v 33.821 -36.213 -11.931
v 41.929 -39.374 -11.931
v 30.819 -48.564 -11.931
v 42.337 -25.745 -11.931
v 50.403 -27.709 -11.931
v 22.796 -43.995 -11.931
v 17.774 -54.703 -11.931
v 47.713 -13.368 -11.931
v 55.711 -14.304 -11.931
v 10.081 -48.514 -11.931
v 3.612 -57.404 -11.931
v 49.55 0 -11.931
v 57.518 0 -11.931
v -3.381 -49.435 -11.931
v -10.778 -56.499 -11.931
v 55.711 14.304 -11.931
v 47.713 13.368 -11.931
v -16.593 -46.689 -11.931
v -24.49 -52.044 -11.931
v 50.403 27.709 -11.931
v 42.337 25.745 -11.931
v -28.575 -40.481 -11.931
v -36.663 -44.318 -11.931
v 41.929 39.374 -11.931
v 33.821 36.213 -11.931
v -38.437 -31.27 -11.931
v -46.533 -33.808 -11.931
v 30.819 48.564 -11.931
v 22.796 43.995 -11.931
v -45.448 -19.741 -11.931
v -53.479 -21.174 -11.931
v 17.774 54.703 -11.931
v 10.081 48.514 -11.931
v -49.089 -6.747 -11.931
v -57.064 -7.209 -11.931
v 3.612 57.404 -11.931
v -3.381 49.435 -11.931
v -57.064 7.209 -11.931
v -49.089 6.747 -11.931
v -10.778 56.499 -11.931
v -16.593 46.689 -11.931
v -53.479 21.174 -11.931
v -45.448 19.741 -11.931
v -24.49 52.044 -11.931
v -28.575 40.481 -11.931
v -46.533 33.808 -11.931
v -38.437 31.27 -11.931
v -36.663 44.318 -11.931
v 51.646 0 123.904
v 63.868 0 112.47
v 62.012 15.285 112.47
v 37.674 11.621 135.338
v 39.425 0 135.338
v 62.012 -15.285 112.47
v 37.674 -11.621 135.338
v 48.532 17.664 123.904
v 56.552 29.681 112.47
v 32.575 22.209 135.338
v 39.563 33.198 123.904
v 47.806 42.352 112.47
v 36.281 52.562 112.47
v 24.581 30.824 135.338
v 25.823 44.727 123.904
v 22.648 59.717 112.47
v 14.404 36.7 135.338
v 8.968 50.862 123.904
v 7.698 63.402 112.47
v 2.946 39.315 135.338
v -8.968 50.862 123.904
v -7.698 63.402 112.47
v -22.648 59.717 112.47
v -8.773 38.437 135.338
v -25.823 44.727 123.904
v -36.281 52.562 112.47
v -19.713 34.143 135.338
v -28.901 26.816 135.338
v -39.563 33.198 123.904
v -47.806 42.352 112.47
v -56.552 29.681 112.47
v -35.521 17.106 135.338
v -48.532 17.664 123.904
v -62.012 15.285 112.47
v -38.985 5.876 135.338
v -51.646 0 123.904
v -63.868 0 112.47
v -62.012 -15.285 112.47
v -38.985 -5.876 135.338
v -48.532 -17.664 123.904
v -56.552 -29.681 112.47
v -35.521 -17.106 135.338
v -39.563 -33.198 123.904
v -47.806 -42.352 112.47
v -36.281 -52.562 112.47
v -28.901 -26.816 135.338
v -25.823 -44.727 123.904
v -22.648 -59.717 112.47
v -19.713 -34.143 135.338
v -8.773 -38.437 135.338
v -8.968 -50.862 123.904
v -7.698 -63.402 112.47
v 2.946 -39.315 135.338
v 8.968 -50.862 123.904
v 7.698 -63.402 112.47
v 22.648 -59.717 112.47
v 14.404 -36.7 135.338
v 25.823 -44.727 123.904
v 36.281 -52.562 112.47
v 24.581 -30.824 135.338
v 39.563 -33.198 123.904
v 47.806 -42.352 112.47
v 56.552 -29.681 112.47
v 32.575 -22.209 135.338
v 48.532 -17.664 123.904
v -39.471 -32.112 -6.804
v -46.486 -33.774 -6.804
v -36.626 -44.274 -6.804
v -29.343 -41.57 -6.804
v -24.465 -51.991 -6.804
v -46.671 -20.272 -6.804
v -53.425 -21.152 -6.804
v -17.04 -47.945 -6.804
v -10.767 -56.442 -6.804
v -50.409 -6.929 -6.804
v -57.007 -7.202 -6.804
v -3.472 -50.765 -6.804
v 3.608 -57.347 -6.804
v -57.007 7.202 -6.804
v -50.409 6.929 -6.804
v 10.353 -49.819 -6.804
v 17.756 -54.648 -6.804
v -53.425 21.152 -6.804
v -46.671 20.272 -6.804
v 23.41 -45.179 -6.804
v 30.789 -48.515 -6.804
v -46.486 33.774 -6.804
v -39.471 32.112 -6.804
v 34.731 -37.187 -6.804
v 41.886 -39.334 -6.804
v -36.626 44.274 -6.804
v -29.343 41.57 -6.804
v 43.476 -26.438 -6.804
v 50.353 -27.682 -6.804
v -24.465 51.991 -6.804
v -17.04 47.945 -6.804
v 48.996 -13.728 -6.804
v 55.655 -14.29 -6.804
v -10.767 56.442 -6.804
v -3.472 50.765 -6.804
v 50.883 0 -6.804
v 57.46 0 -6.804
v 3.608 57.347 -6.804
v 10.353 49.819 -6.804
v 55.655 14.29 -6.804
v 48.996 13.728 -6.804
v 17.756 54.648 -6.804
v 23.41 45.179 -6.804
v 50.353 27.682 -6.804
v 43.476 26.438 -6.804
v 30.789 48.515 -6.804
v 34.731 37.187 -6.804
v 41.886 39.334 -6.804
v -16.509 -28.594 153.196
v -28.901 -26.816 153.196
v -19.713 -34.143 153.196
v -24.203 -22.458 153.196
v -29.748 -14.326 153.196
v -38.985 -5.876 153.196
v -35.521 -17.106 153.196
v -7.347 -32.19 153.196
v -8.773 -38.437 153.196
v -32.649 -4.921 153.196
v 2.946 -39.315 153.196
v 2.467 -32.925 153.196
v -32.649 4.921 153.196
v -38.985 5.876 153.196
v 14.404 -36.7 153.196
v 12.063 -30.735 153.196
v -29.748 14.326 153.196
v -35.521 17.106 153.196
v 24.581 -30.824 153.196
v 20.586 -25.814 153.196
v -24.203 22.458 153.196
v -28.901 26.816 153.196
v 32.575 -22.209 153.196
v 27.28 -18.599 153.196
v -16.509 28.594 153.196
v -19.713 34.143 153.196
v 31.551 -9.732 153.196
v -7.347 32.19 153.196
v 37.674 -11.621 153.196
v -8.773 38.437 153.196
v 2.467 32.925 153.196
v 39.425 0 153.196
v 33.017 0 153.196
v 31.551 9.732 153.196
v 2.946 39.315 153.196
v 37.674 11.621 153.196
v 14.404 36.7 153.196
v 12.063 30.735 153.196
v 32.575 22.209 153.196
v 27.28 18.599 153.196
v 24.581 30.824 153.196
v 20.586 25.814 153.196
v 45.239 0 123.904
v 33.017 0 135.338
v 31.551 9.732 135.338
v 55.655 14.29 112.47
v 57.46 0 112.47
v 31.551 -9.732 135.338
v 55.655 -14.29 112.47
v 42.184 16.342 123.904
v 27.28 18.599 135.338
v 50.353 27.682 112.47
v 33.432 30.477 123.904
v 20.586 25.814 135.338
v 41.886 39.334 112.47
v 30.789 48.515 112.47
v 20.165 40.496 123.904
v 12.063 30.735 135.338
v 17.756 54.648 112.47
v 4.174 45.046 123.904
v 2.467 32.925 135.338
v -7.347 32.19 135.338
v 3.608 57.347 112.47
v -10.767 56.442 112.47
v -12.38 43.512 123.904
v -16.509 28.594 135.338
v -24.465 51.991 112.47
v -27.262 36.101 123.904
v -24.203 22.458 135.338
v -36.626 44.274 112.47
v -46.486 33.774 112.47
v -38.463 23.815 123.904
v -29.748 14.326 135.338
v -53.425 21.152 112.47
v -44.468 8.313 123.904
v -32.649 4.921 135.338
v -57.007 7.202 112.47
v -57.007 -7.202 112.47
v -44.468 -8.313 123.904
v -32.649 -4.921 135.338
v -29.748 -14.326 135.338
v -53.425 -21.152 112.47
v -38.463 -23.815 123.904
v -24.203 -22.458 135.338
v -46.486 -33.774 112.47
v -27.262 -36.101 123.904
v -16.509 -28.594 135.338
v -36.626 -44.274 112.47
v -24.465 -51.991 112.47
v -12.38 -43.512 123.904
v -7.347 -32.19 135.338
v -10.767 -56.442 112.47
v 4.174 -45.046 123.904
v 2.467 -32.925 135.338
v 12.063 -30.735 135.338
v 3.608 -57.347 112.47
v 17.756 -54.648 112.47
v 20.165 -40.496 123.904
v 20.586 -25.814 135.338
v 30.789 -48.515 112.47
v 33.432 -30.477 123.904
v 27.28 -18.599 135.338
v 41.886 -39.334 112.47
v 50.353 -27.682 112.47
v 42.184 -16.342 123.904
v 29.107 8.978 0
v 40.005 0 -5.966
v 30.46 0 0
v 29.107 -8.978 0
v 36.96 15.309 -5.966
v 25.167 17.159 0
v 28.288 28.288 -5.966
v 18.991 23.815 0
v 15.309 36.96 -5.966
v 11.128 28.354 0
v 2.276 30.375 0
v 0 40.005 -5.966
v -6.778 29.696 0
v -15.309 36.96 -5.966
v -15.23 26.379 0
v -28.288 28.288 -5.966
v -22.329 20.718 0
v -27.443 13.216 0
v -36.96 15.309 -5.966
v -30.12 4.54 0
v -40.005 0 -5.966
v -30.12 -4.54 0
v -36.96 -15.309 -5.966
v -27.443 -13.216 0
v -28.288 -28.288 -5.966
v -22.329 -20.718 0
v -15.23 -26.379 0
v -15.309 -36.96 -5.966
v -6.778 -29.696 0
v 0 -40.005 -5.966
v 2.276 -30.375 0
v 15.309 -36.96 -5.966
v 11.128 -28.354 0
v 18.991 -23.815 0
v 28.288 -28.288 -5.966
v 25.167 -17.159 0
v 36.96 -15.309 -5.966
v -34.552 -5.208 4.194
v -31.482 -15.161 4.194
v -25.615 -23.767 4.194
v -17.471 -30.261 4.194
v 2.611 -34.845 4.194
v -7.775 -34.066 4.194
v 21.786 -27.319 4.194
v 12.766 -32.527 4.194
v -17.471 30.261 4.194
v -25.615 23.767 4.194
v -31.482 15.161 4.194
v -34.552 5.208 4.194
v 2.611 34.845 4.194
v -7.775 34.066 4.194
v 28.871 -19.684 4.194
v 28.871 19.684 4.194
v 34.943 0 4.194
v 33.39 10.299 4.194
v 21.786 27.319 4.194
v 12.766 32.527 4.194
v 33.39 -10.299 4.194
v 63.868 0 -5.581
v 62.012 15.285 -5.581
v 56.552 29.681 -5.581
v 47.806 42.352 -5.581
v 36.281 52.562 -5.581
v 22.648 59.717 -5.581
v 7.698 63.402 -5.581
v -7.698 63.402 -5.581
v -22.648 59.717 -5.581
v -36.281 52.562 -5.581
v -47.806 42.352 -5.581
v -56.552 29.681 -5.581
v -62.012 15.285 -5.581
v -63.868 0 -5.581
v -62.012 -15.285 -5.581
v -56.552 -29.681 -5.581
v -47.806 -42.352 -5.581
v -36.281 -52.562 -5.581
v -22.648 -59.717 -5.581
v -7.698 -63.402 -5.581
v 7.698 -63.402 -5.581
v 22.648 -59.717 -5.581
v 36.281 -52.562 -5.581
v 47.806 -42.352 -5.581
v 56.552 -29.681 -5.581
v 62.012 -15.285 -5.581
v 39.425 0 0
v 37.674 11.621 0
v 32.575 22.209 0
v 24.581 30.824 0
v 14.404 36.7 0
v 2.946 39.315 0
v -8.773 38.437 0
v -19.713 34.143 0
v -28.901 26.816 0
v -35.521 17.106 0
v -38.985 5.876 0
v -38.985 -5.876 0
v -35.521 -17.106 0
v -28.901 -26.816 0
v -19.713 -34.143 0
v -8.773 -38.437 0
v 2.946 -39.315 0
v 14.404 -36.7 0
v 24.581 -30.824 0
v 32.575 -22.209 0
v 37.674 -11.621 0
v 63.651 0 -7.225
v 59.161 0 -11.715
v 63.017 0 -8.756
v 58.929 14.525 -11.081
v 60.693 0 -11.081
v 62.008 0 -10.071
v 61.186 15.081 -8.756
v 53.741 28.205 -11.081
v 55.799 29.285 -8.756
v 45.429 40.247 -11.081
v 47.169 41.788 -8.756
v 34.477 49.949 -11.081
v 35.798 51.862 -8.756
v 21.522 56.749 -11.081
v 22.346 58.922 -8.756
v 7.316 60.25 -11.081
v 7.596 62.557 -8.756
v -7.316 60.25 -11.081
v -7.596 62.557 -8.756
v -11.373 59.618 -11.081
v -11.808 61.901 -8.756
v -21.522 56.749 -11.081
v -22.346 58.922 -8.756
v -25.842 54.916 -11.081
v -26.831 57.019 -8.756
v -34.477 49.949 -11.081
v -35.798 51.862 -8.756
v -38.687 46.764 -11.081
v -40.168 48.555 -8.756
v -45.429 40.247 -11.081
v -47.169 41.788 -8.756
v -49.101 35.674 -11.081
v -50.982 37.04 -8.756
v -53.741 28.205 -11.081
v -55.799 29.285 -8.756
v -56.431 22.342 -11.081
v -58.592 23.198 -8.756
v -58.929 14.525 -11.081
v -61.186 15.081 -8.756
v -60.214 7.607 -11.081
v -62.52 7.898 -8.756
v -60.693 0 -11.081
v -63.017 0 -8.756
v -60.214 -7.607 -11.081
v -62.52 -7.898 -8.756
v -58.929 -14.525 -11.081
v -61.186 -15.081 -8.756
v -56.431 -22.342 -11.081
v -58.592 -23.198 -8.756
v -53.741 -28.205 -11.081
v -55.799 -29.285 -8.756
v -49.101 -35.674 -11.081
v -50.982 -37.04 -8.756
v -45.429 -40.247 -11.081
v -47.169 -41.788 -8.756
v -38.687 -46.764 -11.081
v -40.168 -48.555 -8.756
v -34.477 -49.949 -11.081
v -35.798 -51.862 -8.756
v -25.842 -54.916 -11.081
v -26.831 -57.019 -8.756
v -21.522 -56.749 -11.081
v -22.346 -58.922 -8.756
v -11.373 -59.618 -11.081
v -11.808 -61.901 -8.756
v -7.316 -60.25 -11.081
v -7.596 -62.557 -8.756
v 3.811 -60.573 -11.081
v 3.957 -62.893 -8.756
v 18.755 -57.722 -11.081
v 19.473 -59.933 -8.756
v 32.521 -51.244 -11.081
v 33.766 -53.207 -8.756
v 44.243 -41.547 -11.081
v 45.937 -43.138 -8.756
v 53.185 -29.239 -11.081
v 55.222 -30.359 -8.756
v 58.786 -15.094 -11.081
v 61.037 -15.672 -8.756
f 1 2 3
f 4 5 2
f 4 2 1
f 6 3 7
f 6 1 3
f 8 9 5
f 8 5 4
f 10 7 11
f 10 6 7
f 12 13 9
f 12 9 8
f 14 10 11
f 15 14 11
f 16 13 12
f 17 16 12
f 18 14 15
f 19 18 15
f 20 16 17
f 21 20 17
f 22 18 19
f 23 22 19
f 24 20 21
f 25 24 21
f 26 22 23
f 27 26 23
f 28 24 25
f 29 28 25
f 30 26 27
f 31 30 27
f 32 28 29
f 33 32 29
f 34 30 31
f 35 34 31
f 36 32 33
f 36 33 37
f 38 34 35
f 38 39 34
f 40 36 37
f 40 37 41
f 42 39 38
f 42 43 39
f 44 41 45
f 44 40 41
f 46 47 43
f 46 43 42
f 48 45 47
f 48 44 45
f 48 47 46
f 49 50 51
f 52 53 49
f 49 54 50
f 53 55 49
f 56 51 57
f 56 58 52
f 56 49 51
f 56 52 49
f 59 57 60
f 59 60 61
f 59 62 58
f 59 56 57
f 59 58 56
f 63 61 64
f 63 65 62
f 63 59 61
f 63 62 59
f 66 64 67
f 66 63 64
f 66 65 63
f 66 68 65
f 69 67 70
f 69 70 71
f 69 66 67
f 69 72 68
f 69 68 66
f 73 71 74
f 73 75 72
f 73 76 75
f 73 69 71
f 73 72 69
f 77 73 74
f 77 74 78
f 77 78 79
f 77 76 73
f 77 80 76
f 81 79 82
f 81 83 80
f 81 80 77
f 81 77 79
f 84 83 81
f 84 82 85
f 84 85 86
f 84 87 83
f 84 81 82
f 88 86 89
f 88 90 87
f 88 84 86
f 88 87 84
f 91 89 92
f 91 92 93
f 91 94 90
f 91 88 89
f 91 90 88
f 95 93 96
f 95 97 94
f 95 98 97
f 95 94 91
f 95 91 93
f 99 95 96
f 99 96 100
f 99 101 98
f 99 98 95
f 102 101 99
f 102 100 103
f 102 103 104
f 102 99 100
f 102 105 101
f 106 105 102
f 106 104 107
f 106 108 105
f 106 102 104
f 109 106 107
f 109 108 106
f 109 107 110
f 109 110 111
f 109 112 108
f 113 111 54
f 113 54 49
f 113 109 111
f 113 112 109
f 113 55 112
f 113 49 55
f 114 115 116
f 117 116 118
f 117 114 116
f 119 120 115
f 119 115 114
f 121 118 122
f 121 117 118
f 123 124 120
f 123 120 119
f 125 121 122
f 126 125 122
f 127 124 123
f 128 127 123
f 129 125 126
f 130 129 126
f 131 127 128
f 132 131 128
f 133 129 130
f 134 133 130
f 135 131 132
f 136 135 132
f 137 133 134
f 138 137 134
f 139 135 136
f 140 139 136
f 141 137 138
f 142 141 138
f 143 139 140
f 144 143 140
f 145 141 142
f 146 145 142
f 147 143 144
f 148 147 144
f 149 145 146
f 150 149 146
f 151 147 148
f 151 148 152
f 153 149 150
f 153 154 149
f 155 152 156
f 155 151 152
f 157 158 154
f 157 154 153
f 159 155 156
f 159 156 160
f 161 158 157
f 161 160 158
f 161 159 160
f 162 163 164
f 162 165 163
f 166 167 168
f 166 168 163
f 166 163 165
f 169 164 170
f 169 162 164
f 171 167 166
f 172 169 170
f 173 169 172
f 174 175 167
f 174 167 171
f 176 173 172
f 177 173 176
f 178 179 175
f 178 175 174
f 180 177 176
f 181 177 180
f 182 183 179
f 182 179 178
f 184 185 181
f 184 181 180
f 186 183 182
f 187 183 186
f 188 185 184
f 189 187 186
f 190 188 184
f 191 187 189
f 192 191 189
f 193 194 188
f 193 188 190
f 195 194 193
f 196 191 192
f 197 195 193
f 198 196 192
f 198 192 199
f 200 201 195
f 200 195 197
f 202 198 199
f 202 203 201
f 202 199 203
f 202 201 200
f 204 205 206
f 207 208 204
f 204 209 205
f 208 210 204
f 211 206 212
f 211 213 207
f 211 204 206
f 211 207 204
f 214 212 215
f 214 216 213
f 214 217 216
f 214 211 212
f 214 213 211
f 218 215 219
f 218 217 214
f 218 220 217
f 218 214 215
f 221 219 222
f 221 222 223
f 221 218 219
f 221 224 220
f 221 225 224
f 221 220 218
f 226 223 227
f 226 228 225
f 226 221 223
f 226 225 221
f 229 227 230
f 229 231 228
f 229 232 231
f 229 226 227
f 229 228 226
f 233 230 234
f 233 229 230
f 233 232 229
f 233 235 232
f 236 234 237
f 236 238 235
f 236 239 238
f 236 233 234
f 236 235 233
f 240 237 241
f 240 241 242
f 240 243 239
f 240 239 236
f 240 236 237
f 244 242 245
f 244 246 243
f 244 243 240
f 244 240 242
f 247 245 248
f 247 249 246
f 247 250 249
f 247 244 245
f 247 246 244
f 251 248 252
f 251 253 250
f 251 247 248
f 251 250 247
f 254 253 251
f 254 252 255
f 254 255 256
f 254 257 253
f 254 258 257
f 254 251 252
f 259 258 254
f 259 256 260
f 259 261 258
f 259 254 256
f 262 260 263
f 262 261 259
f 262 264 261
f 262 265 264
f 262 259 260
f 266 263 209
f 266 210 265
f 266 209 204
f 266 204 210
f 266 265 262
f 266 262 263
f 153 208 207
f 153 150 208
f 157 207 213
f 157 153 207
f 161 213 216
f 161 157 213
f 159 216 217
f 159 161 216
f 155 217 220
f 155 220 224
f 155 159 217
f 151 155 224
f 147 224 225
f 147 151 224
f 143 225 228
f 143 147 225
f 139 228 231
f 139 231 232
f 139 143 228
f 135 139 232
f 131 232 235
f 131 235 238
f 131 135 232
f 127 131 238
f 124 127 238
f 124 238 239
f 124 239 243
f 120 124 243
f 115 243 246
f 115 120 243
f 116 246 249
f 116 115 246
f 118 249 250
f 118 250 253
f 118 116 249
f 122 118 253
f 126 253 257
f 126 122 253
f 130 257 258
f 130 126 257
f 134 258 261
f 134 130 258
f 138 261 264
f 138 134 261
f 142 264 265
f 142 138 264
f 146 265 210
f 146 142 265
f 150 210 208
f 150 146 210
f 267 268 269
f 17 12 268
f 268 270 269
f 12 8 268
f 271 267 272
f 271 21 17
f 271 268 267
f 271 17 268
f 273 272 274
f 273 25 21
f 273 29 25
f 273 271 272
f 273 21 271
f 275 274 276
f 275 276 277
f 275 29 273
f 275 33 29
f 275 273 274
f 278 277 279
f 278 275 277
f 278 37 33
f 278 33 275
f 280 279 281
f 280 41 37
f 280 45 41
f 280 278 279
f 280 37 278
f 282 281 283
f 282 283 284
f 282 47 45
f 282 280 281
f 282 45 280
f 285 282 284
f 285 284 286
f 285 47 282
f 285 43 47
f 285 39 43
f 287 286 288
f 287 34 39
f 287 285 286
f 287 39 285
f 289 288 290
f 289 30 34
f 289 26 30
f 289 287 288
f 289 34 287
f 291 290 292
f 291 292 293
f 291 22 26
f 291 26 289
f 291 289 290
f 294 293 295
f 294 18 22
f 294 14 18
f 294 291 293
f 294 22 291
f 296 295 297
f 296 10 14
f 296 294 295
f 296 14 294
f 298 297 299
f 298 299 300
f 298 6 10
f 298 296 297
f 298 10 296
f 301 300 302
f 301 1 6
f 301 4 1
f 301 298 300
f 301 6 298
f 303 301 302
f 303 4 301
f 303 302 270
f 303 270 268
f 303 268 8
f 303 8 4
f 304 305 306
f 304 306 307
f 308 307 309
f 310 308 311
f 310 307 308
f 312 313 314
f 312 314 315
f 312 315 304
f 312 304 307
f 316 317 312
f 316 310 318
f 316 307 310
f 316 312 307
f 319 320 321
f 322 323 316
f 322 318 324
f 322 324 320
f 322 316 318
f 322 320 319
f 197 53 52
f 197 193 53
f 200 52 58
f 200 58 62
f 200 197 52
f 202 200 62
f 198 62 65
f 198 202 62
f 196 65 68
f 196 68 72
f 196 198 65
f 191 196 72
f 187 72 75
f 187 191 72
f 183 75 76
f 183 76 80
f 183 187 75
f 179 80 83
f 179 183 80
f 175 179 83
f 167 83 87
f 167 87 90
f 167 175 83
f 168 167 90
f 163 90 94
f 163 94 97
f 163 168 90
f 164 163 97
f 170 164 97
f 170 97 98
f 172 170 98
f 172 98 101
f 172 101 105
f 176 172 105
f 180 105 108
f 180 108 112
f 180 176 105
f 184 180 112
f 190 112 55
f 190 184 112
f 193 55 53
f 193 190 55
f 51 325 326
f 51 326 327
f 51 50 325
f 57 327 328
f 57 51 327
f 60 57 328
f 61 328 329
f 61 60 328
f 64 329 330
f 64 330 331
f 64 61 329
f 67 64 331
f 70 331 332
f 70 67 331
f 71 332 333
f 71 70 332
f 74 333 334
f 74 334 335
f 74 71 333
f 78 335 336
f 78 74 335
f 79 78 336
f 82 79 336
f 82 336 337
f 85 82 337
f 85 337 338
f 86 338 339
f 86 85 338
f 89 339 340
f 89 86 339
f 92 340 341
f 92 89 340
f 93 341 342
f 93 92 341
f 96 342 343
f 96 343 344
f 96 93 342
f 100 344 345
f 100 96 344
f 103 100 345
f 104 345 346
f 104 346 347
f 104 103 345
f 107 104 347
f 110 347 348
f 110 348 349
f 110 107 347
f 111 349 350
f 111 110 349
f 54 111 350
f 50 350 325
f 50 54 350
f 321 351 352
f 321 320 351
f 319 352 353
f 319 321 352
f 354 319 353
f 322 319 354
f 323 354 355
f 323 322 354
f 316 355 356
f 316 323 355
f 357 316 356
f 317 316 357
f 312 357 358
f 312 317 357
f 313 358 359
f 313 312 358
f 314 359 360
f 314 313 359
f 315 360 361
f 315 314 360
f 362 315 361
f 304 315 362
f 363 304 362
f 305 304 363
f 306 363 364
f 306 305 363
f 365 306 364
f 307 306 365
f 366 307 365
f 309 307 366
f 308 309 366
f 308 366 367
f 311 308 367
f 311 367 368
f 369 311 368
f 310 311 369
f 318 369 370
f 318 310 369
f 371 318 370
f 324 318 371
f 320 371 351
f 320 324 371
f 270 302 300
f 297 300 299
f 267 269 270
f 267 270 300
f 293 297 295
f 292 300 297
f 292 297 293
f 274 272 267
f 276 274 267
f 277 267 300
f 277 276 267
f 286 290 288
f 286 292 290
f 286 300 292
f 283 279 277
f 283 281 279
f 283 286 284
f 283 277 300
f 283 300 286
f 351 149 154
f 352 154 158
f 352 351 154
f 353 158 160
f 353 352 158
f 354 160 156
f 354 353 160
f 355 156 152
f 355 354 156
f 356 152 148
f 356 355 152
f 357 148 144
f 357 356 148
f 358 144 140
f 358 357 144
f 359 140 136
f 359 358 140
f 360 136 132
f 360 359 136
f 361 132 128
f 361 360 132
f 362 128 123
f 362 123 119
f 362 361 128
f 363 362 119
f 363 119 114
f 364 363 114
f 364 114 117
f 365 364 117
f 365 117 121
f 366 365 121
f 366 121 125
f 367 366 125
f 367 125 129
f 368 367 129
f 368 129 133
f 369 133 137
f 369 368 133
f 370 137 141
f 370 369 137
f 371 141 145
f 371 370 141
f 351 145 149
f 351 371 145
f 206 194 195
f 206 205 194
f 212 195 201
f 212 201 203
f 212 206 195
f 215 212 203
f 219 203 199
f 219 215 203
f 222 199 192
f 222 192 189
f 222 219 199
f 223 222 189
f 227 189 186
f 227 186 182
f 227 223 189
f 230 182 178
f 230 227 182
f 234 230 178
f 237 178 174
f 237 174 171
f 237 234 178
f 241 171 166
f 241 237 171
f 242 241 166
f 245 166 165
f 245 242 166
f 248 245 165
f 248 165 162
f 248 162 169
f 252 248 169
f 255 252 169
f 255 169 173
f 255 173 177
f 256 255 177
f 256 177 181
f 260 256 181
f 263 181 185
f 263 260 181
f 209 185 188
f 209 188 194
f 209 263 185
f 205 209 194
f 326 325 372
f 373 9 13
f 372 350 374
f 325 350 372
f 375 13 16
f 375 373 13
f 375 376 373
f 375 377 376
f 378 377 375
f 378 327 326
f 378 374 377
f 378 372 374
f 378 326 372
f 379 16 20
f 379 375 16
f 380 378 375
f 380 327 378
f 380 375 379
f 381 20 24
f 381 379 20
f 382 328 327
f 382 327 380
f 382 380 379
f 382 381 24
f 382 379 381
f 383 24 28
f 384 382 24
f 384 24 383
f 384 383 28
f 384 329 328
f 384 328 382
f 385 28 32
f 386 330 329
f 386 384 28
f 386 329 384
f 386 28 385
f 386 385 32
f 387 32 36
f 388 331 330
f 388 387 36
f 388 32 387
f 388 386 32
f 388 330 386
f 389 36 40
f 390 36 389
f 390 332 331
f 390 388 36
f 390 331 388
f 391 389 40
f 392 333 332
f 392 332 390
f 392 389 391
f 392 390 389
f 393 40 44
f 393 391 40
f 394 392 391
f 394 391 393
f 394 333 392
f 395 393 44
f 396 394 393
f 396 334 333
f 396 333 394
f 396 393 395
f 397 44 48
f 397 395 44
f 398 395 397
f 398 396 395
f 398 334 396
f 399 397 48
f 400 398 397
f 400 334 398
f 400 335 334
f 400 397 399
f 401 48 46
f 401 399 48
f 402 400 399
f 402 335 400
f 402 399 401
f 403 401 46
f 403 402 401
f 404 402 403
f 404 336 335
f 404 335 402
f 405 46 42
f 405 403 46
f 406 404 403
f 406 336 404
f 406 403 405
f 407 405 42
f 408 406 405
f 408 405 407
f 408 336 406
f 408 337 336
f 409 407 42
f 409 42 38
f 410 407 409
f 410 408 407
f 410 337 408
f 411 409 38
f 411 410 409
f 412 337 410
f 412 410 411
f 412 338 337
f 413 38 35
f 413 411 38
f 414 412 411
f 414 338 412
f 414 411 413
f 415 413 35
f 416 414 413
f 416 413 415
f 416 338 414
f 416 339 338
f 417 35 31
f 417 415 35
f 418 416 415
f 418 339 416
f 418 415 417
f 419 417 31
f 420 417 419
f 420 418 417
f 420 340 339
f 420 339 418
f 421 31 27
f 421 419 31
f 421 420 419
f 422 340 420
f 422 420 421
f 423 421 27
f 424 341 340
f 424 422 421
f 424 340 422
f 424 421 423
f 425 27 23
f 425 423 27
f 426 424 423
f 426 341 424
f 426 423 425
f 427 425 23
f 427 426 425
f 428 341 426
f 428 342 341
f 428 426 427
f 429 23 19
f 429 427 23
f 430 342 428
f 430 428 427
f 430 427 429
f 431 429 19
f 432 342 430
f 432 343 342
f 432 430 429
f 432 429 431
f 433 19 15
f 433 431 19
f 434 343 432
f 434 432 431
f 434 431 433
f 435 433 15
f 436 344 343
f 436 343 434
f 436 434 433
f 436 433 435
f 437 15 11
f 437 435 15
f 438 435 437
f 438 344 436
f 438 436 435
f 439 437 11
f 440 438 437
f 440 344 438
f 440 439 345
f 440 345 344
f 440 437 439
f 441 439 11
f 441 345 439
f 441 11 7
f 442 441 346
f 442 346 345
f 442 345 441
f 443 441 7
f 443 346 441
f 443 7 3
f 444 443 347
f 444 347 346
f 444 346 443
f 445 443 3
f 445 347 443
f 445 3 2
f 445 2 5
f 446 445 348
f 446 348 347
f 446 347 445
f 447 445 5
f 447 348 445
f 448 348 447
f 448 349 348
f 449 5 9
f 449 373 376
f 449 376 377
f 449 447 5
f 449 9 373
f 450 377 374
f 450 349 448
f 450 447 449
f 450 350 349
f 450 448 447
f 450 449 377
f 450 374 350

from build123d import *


with BuildPart() as f1:
    # F0 (on Front) → F1 (revolve)
    with BuildSketch(Plane.XZ):
        with BuildLine():
            Line((0, 4.193819), (0, 0))
            Line((0, 0), (30.459946, 0))
            Line((30.459946, 0), (49.550053, -11.931316))
            Line((49.550053, -11.931316), (57.517636, -11.931316))
            ThreePointArc((57.517636, -11.931316), (62.007764, -10.071444), (63.867636, -5.581316))
            Line((63.867636, -5.581316), (63.867636, 73.131949))
            Line((63.867636, 73.131949), (63.867636, 112.469681))
            Line((63.867636, 112.469681), (39.425094, 135.337606))
            Line((39.425094, 135.337606), (39.425094, 153.195813))
            Line((39.425094, 153.195813), (33.017382, 153.195813))
            Line((33.017382, 153.195813), (33.017382, 135.337606))
            Line((33.017382, 135.337606), (57.459924, 112.469681))
            Line((57.459924, 112.469681), (57.459924, -6.803995))
            Line((57.459924, -6.803995), (50.88336, -6.803995))
            Line((50.88336, -6.803995), (39.425094, 0))
            Line((39.425094, 0), (34.942501, 4.193819))
            Line((34.942501, 4.193819), (6.416916, 4.193819))
            Line((6.416916, 4.193819), (0, 4.193819))
        make_face()
    revolve(axis=Axis((0, 0, 36.565974), (0, 0, 1)))


solid = f1.part
